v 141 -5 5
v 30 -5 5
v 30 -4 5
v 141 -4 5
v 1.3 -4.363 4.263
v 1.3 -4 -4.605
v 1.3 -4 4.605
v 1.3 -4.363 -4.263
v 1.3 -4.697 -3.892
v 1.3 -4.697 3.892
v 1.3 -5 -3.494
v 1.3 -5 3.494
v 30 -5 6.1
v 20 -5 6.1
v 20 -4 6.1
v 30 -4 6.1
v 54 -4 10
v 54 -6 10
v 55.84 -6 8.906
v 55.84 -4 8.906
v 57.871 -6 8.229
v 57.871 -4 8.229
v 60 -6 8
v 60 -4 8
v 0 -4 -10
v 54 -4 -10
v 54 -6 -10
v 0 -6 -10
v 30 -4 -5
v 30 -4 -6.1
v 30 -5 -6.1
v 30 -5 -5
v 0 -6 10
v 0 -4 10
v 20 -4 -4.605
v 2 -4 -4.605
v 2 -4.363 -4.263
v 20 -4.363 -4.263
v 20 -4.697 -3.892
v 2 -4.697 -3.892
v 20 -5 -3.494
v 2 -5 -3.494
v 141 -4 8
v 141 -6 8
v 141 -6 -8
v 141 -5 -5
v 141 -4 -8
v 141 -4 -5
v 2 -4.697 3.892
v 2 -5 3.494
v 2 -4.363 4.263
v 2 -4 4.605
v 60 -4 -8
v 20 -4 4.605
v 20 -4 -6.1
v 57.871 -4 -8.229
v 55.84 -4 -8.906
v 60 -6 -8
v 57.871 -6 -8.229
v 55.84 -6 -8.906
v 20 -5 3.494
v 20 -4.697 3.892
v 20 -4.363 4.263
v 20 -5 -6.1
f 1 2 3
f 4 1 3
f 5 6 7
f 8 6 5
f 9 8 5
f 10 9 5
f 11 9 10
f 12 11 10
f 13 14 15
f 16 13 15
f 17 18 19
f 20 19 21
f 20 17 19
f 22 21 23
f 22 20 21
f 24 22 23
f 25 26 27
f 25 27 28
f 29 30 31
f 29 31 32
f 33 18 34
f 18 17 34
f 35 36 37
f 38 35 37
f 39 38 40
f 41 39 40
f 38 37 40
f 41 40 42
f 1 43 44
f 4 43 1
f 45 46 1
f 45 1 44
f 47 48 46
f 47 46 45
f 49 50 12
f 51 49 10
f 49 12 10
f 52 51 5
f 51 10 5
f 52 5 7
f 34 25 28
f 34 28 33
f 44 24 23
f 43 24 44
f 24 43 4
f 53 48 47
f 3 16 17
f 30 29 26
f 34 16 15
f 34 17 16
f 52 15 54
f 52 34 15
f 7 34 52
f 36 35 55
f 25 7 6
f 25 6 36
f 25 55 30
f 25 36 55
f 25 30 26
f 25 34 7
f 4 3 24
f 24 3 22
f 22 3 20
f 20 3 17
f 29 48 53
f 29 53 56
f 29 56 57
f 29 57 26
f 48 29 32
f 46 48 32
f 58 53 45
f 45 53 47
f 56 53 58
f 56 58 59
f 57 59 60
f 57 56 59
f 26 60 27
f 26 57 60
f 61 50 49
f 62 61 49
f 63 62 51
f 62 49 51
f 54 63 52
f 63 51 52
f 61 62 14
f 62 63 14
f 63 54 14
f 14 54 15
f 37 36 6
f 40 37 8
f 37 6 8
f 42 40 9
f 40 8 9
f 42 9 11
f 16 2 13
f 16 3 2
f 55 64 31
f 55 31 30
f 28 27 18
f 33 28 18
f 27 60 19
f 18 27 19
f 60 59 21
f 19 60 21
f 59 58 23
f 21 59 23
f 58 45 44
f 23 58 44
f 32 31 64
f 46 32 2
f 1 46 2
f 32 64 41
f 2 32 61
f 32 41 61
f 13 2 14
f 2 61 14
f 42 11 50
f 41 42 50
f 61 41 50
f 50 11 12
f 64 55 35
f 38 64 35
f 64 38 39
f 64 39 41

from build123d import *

# Parameters (mm, degrees)
SKETCH1_R               = 2
BOSS_EXTRUDE1_DEPTH     = 4
BOSS_EXTRUDE2_DEPTH     = 6
CUT_EXTRUDE1_START      = -2
CUT_EXTRUDE1_DEPTH      = 18
SKETCH4_W               = 12.2
SKETCH4_H               = 11
CUT_EXTRUDE2_DEPTH      = 10
SKETCH5_W               = 20
SKETCH5_H               = 2
BOSS_EXTRUDE3_DEPTH     = 35
CUT_EXTRUDE4_START      = -0.7
CUT_EXTRUDE4_DEPTH      = 0.7
CUT_EXTRUDE5_DEPTH      = 1
CUT_EXTRUDE6_REACH      = 144.046
SKETCH12_W              = 87
SKETCH12_H              = 2
FILLET1_R               = 10
CUT_EXTRUDE7_DEPTH      = 112.736296699
SKETCH14_W              = 20
SKETCH14_H              = 2
CUT_EXTRUDE8_DEPTH      = 142.58036587
FILLET2_R               = 10
CUT_EXTRUDE9_DEPTH      = 142.58036587
CUT_EXTRUDE9_DEPTH_BACK = 142.58036587
SKETCH15_W              = 20
SKETCH15_H              = 8
CUT_EXTRUDE10_REACH     = 143.58
SKETCH16_W              = 20
SKETCH16_H              = 2


with BuildPart() as part:
    # Sketch1 → Boss-Extrude1 (new, symmetric)
    with BuildSketch(Plane(origin=(0, 0, 0), x_dir=(1, 0, 0), z_dir=(0, 1, 0))):
        with BuildLine():
            ThreePointArc((-4, 7.5), (-11.5, 0), (-4, -7.5))
            Line((-4, -7.5), (0, -7.5))
            Line((0, -7.5), (0, 7.5))
            Line((0, 7.5), (-4, 7.5))
        make_face()
        with Locations(Location((-4, 0, 0), (0, 0, 270))):
            Circle(SKETCH1_R, mode=Mode.SUBTRACT)
    extrude(amount=BOSS_EXTRUDE1_DEPTH, both=True)

    # Sketch1<3> → Boss-Extrude2 (add, symmetric)
    with BuildSketch(Plane(origin=(0, 0, 0), x_dir=(1, 0, 0), z_dir=(0, 1, 0))):
        Polygon((0, 10), (0, 7.5), (0, 0), (141, 0), (141, 10), align=None)
        Polygon((0, 0), (0, -7.5), (0, -10), (141, -10), (141, 0), align=None)
    extrude(amount=BOSS_EXTRUDE2_DEPTH, both=True)

    # Sketch3 → Cut-Extrude1 (cut)
    with BuildSketch(Plane.ZY.offset(CUT_EXTRUDE1_START)):
        with BuildLine():
            Line((-3.494281042, -5), (3.494281042, -5))
            ThreePointArc((3.494281042, -5), (5.4094877, -2.819120931), (6.1, 0))
            Line((6.1, 0), (6.1, 6))
            Line((6.1, 6), (-6.1, 6))
            Line((-6.1, 6), (-6.1, 0))
            ThreePointArc((-6.1, 0), (-5.4094877, -2.819120931), (-3.494281042, -5))
        make_face()
    extrude(amount=-CUT_EXTRUDE1_DEPTH, mode=Mode.SUBTRACT)

    # Sketch4 → Cut-Extrude2 (cut)
    with BuildSketch(Plane.ZY.offset(-20)):
        with Locations((0, 0.5)):
            Rectangle(SKETCH4_W, SKETCH4_H)
    extrude(amount=-CUT_EXTRUDE2_DEPTH, mode=Mode.SUBTRACT)

    # Sketch5 → Boss-Extrude3 (add)
    with BuildSketch(Plane.ZY):
        with Locations((0, -7)):
            Rectangle(SKETCH5_W, SKETCH5_H)
    extrude(amount=-BOSS_EXTRUDE3_DEPTH)

    # Sketch9 → Cut-Extrude4 (cut)
    with BuildSketch(Plane(origin=(2, 0, 0), x_dir=(0, 0, -1), z_dir=(1, 0, 0)).offset(CUT_EXTRUDE4_START)):
        with BuildLine():
            Line((3.494281042, -5), (-3.494281042, -5))
            ThreePointArc((-3.494281042, -5), (-6.1, 0), (-3.494281042, 5))
            Line((-3.494281042, 5), (3.494281042, 5))
            ThreePointArc((3.494281042, 5), (6.1, 0), (3.494281042, -5))
        make_face()
    extrude(amount=CUT_EXTRUDE4_DEPTH, mode=Mode.SUBTRACT)

    # Sketch11 → Cut-Extrude5 (cut, symmetric)
    with BuildSketch(Plane(origin=(0, 0, 0), x_dir=(1, 0, 0), z_dir=(0, 1, 0))):
        with BuildLine():
            Line((2, 1), (2, -1))
            ThreePointArc((2, -1), (0.585786391, -1.585786484), (0, -3.000000131))
            Line((0, -3.000000131), (0, -7.5))
            Line((0, -7.5), (-2, -7.5))
            Line((-2, -7.5), (-2, -3.000000131))
            ThreePointArc((-2, -3.000000131), (-0.828427171, -0.171572922), (2, 1))
        make_face()
    extrude(amount=CUT_EXTRUDE5_DEPTH, both=True, mode=Mode.SUBTRACT)

    # Sketch12 → Cut-Extrude6 (cut, up to next)
    with BuildSketch(Plane(origin=(0, 6, 0), x_dir=(1, 0, 0), z_dir=(0, 1, 0)), mode=Mode.PRIVATE) as cut_extrude6_sk1:
        with Locations((97.5, 9)):
            Rectangle(SKETCH12_W, SKETCH12_H)
    cut_extrude6_tool1 = extrude(cut_extrude6_sk1.sketch, amount=-CUT_EXTRUDE6_REACH, mode=Mode.PRIVATE) & part.part
    # Sketch12 → Cut-Extrude6 (cut, up to next)
    with BuildSketch(Plane(origin=(0, 6, 0), x_dir=(1, 0, 0), z_dir=(0, 1, 0)), mode=Mode.PRIVATE) as cut_extrude6_sk2:
        with Locations((97.5, -9)):
            Rectangle(SKETCH12_W, SKETCH12_H)
    cut_extrude6_tool2 = extrude(cut_extrude6_sk2.sketch, amount=-CUT_EXTRUDE6_REACH, mode=Mode.PRIVATE) & part.part
    add(cut_extrude6_tool1.solids().sort_by_distance((97.5, 6, -9))[0], mode=Mode.SUBTRACT)
    add(cut_extrude6_tool2.solids().sort_by_distance((97.5, 6, 9))[0], mode=Mode.SUBTRACT)

    # Fillet1
    # the kernel refuses this fillet: 10 mm, written as the material it adds along each edge
    with BuildSketch(Plane(origin=(54, 6, 8), x_dir=(0, 0, 1), z_dir=(0, -1, 0))) as fillet1_piece_1:
        with BuildLine():
            CenterArc((10, -6), FILLET1_R, 143.130102354, 36.869897646)
            Line((0, -6), (-0.2, -6))
            Line((-0.2, -6), (-0.2, 0))
            Line((-0.2, 0), (0, 0.2))
            ThreePointArc((0, 0.2), (1, 0.2), (1.84, 0.12))
            Line((1.84, 0.12), (2, 0))
        make_face()
    extrude(amount=12)
    with BuildSketch(Plane(origin=(54, 6, -8), x_dir=(0, 0, -1), z_dir=(0, -1, 0))) as fillet1_piece_2:
        with BuildLine():
            CenterArc((10, 6), FILLET1_R, 180, 36.869897646)
            Line((0, 6), (-0.2, 6))
            Line((-0.2, 6), (-0.2, 0))
            Line((-0.2, 0), (0, -0.2))
            ThreePointArc((0, -0.2), (1, -0.2), (1.84, -0.12))
            Line((1.84, -0.12), (2, 0))
        make_face()
    extrude(amount=12)

    # Sketch13 → Cut-Extrude7 (cut, through all)
    with BuildSketch(Plane.ZY.offset(-30)):
        Polygon((-5, 5), (-5, 1), (-3.5, 1), (-3.5, -1), (-5, -1), (-5, -5), (5, -5), (5, -1), (3.5, -1), (3.5, 1), (5, 1), (5, 5), align=None)
    extrude(amount=-CUT_EXTRUDE7_DEPTH, mode=Mode.SUBTRACT)

    # Sketch14 → Cut-Extrude8 (cut, through all)
    with BuildSketch(Plane.ZY):
        with Locations((0, 5)):
            Rectangle(SKETCH14_W, SKETCH14_H)
    extrude(amount=-CUT_EXTRUDE8_DEPTH, mode=Mode.SUBTRACT)

    # Fillet2
    # the kernel refuses this fillet: 10 mm, written as the material it adds along each edge
    with BuildSketch(Plane(origin=(35, -6, -10), x_dir=(1, 0, 0), z_dir=(0, 0, 1))) as fillet2_piece_1:
        with BuildLine():
            CenterArc((6, -10), FILLET2_R, 90, 36.869897646)
            Line((0, -2), (-0.12, -1.84))
            ThreePointArc((-0.12, -1.84), (-0.2, -1), (-0.2, 0))
            Line((-0.2, 0), (0, 0.2))
            Line((0, 0.2), (6, 0.2))
            Line((6, 0.2), (6, 0))
        make_face()
    extrude(amount=20)

    # Sketch15 → Cut-Extrude9 (cut, two sides: drawn at the far end of the back side and taken through both)
    with BuildSketch(Plane(origin=(0, 0, 0), x_dir=(0, 0, -1), z_dir=(1, 0, 0)).offset(-CUT_EXTRUDE9_DEPTH_BACK)):
        Rectangle(SKETCH15_W, SKETCH15_H)
    extrude(amount=CUT_EXTRUDE9_DEPTH + CUT_EXTRUDE9_DEPTH_BACK, mode=Mode.SUBTRACT)

    # Sketch16 → Cut-Extrude10 (cut, up to next)
    with BuildSketch(Plane(origin=(0, 0, 0), x_dir=(0, 0, -1), z_dir=(1, 0, 0)), mode=Mode.PRIVATE) as cut_extrude10_sk1:
        with Locations((0, -7)):
            Rectangle(SKETCH16_W, SKETCH16_H)
    cut_extrude10_tool1 = extrude(cut_extrude10_sk1.sketch, amount=CUT_EXTRUDE10_REACH, mode=Mode.PRIVATE) & part.part
    add(cut_extrude10_tool1.solids().sort_by_distance((0, -7, 0))[0], mode=Mode.SUBTRACT)


solid = part.part
